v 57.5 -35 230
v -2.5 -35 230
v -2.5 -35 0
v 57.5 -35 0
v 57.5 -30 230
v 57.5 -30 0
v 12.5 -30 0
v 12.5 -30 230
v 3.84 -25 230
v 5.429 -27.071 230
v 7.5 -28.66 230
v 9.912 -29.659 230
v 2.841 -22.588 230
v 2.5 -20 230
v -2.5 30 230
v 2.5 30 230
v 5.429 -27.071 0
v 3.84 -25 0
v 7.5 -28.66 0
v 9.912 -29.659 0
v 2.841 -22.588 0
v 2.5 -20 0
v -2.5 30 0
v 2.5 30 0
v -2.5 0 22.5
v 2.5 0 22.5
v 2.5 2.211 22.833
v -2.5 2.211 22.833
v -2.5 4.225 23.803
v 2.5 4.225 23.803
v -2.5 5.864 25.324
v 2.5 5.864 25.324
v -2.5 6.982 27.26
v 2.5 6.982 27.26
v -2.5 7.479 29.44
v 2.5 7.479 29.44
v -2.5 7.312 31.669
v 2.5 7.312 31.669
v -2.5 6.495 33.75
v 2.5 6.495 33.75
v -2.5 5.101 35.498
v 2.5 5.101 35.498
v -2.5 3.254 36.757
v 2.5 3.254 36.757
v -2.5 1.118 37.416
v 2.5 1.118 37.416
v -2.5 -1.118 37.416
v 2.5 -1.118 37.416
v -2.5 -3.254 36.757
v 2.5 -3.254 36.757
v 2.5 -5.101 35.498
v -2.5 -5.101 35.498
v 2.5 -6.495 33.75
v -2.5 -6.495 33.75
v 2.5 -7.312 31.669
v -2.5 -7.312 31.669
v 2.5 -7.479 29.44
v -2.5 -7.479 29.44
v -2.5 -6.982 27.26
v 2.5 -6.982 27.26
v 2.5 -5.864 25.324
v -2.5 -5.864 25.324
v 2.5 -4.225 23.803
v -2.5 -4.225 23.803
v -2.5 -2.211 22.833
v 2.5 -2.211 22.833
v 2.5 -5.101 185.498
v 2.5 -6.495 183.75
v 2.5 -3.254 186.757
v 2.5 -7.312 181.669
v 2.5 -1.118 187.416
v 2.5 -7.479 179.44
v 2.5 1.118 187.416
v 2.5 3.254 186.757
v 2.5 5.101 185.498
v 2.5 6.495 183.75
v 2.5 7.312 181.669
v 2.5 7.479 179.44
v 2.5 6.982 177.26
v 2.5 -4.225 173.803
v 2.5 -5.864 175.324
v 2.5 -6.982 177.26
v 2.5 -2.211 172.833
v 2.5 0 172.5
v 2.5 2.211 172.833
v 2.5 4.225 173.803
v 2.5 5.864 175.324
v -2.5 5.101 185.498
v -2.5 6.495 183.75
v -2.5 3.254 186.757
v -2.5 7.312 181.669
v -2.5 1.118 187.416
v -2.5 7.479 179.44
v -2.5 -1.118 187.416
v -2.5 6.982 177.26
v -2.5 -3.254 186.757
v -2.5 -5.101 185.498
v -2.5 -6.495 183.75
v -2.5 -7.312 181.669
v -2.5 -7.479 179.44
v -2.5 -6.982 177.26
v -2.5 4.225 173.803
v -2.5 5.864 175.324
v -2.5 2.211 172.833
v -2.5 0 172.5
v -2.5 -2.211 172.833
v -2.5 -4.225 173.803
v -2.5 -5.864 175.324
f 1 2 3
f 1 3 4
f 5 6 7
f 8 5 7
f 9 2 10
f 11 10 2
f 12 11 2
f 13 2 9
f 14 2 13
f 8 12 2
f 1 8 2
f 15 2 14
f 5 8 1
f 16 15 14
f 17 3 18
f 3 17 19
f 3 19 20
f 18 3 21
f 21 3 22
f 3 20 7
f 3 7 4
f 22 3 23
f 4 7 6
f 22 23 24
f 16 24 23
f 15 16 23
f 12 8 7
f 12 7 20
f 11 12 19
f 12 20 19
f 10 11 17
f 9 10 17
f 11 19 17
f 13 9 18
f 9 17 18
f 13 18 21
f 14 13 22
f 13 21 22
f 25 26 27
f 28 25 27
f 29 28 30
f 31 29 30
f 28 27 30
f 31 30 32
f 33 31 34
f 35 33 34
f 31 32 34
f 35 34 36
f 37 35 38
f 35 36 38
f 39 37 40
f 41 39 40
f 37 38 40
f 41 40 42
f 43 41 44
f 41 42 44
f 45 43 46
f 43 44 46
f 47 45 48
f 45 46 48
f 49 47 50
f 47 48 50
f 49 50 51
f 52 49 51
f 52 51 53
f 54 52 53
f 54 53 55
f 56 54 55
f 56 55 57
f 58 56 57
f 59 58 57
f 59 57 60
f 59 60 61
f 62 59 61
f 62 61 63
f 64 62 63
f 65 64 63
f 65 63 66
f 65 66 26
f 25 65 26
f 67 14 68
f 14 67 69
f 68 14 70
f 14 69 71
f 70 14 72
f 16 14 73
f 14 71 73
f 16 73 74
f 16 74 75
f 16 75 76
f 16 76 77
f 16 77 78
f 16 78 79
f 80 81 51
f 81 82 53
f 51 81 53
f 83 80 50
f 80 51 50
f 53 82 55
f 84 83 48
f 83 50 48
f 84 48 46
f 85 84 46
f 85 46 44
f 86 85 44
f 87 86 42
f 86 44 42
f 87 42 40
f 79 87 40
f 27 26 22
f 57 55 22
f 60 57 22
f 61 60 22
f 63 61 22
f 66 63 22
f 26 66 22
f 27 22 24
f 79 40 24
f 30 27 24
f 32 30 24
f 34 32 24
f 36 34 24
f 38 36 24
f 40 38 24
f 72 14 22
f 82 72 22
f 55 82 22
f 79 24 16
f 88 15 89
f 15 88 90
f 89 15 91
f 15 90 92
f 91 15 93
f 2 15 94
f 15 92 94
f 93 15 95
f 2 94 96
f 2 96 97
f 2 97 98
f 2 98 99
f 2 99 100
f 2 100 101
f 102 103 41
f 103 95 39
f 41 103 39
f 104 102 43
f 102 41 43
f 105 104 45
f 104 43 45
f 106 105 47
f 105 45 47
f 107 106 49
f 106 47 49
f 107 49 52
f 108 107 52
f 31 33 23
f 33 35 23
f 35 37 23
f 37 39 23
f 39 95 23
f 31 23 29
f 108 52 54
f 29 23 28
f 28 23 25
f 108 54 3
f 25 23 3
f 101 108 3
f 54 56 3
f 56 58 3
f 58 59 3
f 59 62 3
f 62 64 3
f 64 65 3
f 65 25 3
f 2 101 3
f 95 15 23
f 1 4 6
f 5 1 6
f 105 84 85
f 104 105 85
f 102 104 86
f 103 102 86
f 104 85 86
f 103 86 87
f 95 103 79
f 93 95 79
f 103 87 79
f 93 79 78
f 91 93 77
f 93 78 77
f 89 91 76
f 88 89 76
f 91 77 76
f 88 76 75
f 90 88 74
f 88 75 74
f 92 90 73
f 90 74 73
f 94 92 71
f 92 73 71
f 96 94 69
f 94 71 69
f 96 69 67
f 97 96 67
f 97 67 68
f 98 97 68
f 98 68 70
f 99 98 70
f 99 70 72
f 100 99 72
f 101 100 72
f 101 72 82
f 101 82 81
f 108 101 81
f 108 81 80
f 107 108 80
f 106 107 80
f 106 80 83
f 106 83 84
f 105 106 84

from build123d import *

# Parameters (mm, degrees)
BOSS_EXTRUDE1_DEPTH = 230
CUT_EXTRUDE1_REACH  = 241.061
SKETCH2_R           = 7.5


with BuildPart() as part:
    # Sketch1 → Boss-Extrude1 (new body)
    with BuildSketch(Plane.XY):
        with BuildLine():
            Line((2.5, -20), (2.5, 30))
            Line((2.5, 30), (-2.5, 30))
            Line((-2.5, 30), (-2.5, -30))
            Line((-2.5, -30), (-2.5, -35))
            Line((-2.5, -35), (57.5, -35))
            Line((57.5, -35), (57.5, -30))
            Line((57.5, -30), (12.5, -30))
            ThreePointArc((12.5, -30), (5.428932188, -27.071067812), (2.5, -20))
        make_face()
    extrude(amount=BOSS_EXTRUDE1_DEPTH)

    # Sketch2 → Cut-Extrude1 (cut, up to next)
    with BuildSketch(Plane(origin=(2.5, 0, 0), x_dir=(0, 0, -1), z_dir=(1, 0, 0)), mode=Mode.PRIVATE) as cut_extrude1_sk1:
        with Locations((-30, 0)):
            Circle(SKETCH2_R)
    cut_extrude1_tool1 = extrude(cut_extrude1_sk1.sketch, amount=-CUT_EXTRUDE1_REACH, mode=Mode.PRIVATE) & part.part
    # Sketch2 → Cut-Extrude1 (cut, up to next)
    with BuildSketch(Plane(origin=(2.5, 0, 0), x_dir=(0, 0, -1), z_dir=(1, 0, 0)), mode=Mode.PRIVATE) as cut_extrude1_sk2:
        with Locations((-180, 0)):
            Circle(SKETCH2_R)
    cut_extrude1_tool2 = extrude(cut_extrude1_sk2.sketch, amount=-CUT_EXTRUDE1_REACH, mode=Mode.PRIVATE) & part.part
    add(cut_extrude1_tool1.solids().sort_by_distance((2.5, 0, 30))[0], mode=Mode.SUBTRACT)
    add(cut_extrude1_tool2.solids().sort_by_distance((2.5, 0, 180))[0], mode=Mode.SUBTRACT)


solid = part.part
